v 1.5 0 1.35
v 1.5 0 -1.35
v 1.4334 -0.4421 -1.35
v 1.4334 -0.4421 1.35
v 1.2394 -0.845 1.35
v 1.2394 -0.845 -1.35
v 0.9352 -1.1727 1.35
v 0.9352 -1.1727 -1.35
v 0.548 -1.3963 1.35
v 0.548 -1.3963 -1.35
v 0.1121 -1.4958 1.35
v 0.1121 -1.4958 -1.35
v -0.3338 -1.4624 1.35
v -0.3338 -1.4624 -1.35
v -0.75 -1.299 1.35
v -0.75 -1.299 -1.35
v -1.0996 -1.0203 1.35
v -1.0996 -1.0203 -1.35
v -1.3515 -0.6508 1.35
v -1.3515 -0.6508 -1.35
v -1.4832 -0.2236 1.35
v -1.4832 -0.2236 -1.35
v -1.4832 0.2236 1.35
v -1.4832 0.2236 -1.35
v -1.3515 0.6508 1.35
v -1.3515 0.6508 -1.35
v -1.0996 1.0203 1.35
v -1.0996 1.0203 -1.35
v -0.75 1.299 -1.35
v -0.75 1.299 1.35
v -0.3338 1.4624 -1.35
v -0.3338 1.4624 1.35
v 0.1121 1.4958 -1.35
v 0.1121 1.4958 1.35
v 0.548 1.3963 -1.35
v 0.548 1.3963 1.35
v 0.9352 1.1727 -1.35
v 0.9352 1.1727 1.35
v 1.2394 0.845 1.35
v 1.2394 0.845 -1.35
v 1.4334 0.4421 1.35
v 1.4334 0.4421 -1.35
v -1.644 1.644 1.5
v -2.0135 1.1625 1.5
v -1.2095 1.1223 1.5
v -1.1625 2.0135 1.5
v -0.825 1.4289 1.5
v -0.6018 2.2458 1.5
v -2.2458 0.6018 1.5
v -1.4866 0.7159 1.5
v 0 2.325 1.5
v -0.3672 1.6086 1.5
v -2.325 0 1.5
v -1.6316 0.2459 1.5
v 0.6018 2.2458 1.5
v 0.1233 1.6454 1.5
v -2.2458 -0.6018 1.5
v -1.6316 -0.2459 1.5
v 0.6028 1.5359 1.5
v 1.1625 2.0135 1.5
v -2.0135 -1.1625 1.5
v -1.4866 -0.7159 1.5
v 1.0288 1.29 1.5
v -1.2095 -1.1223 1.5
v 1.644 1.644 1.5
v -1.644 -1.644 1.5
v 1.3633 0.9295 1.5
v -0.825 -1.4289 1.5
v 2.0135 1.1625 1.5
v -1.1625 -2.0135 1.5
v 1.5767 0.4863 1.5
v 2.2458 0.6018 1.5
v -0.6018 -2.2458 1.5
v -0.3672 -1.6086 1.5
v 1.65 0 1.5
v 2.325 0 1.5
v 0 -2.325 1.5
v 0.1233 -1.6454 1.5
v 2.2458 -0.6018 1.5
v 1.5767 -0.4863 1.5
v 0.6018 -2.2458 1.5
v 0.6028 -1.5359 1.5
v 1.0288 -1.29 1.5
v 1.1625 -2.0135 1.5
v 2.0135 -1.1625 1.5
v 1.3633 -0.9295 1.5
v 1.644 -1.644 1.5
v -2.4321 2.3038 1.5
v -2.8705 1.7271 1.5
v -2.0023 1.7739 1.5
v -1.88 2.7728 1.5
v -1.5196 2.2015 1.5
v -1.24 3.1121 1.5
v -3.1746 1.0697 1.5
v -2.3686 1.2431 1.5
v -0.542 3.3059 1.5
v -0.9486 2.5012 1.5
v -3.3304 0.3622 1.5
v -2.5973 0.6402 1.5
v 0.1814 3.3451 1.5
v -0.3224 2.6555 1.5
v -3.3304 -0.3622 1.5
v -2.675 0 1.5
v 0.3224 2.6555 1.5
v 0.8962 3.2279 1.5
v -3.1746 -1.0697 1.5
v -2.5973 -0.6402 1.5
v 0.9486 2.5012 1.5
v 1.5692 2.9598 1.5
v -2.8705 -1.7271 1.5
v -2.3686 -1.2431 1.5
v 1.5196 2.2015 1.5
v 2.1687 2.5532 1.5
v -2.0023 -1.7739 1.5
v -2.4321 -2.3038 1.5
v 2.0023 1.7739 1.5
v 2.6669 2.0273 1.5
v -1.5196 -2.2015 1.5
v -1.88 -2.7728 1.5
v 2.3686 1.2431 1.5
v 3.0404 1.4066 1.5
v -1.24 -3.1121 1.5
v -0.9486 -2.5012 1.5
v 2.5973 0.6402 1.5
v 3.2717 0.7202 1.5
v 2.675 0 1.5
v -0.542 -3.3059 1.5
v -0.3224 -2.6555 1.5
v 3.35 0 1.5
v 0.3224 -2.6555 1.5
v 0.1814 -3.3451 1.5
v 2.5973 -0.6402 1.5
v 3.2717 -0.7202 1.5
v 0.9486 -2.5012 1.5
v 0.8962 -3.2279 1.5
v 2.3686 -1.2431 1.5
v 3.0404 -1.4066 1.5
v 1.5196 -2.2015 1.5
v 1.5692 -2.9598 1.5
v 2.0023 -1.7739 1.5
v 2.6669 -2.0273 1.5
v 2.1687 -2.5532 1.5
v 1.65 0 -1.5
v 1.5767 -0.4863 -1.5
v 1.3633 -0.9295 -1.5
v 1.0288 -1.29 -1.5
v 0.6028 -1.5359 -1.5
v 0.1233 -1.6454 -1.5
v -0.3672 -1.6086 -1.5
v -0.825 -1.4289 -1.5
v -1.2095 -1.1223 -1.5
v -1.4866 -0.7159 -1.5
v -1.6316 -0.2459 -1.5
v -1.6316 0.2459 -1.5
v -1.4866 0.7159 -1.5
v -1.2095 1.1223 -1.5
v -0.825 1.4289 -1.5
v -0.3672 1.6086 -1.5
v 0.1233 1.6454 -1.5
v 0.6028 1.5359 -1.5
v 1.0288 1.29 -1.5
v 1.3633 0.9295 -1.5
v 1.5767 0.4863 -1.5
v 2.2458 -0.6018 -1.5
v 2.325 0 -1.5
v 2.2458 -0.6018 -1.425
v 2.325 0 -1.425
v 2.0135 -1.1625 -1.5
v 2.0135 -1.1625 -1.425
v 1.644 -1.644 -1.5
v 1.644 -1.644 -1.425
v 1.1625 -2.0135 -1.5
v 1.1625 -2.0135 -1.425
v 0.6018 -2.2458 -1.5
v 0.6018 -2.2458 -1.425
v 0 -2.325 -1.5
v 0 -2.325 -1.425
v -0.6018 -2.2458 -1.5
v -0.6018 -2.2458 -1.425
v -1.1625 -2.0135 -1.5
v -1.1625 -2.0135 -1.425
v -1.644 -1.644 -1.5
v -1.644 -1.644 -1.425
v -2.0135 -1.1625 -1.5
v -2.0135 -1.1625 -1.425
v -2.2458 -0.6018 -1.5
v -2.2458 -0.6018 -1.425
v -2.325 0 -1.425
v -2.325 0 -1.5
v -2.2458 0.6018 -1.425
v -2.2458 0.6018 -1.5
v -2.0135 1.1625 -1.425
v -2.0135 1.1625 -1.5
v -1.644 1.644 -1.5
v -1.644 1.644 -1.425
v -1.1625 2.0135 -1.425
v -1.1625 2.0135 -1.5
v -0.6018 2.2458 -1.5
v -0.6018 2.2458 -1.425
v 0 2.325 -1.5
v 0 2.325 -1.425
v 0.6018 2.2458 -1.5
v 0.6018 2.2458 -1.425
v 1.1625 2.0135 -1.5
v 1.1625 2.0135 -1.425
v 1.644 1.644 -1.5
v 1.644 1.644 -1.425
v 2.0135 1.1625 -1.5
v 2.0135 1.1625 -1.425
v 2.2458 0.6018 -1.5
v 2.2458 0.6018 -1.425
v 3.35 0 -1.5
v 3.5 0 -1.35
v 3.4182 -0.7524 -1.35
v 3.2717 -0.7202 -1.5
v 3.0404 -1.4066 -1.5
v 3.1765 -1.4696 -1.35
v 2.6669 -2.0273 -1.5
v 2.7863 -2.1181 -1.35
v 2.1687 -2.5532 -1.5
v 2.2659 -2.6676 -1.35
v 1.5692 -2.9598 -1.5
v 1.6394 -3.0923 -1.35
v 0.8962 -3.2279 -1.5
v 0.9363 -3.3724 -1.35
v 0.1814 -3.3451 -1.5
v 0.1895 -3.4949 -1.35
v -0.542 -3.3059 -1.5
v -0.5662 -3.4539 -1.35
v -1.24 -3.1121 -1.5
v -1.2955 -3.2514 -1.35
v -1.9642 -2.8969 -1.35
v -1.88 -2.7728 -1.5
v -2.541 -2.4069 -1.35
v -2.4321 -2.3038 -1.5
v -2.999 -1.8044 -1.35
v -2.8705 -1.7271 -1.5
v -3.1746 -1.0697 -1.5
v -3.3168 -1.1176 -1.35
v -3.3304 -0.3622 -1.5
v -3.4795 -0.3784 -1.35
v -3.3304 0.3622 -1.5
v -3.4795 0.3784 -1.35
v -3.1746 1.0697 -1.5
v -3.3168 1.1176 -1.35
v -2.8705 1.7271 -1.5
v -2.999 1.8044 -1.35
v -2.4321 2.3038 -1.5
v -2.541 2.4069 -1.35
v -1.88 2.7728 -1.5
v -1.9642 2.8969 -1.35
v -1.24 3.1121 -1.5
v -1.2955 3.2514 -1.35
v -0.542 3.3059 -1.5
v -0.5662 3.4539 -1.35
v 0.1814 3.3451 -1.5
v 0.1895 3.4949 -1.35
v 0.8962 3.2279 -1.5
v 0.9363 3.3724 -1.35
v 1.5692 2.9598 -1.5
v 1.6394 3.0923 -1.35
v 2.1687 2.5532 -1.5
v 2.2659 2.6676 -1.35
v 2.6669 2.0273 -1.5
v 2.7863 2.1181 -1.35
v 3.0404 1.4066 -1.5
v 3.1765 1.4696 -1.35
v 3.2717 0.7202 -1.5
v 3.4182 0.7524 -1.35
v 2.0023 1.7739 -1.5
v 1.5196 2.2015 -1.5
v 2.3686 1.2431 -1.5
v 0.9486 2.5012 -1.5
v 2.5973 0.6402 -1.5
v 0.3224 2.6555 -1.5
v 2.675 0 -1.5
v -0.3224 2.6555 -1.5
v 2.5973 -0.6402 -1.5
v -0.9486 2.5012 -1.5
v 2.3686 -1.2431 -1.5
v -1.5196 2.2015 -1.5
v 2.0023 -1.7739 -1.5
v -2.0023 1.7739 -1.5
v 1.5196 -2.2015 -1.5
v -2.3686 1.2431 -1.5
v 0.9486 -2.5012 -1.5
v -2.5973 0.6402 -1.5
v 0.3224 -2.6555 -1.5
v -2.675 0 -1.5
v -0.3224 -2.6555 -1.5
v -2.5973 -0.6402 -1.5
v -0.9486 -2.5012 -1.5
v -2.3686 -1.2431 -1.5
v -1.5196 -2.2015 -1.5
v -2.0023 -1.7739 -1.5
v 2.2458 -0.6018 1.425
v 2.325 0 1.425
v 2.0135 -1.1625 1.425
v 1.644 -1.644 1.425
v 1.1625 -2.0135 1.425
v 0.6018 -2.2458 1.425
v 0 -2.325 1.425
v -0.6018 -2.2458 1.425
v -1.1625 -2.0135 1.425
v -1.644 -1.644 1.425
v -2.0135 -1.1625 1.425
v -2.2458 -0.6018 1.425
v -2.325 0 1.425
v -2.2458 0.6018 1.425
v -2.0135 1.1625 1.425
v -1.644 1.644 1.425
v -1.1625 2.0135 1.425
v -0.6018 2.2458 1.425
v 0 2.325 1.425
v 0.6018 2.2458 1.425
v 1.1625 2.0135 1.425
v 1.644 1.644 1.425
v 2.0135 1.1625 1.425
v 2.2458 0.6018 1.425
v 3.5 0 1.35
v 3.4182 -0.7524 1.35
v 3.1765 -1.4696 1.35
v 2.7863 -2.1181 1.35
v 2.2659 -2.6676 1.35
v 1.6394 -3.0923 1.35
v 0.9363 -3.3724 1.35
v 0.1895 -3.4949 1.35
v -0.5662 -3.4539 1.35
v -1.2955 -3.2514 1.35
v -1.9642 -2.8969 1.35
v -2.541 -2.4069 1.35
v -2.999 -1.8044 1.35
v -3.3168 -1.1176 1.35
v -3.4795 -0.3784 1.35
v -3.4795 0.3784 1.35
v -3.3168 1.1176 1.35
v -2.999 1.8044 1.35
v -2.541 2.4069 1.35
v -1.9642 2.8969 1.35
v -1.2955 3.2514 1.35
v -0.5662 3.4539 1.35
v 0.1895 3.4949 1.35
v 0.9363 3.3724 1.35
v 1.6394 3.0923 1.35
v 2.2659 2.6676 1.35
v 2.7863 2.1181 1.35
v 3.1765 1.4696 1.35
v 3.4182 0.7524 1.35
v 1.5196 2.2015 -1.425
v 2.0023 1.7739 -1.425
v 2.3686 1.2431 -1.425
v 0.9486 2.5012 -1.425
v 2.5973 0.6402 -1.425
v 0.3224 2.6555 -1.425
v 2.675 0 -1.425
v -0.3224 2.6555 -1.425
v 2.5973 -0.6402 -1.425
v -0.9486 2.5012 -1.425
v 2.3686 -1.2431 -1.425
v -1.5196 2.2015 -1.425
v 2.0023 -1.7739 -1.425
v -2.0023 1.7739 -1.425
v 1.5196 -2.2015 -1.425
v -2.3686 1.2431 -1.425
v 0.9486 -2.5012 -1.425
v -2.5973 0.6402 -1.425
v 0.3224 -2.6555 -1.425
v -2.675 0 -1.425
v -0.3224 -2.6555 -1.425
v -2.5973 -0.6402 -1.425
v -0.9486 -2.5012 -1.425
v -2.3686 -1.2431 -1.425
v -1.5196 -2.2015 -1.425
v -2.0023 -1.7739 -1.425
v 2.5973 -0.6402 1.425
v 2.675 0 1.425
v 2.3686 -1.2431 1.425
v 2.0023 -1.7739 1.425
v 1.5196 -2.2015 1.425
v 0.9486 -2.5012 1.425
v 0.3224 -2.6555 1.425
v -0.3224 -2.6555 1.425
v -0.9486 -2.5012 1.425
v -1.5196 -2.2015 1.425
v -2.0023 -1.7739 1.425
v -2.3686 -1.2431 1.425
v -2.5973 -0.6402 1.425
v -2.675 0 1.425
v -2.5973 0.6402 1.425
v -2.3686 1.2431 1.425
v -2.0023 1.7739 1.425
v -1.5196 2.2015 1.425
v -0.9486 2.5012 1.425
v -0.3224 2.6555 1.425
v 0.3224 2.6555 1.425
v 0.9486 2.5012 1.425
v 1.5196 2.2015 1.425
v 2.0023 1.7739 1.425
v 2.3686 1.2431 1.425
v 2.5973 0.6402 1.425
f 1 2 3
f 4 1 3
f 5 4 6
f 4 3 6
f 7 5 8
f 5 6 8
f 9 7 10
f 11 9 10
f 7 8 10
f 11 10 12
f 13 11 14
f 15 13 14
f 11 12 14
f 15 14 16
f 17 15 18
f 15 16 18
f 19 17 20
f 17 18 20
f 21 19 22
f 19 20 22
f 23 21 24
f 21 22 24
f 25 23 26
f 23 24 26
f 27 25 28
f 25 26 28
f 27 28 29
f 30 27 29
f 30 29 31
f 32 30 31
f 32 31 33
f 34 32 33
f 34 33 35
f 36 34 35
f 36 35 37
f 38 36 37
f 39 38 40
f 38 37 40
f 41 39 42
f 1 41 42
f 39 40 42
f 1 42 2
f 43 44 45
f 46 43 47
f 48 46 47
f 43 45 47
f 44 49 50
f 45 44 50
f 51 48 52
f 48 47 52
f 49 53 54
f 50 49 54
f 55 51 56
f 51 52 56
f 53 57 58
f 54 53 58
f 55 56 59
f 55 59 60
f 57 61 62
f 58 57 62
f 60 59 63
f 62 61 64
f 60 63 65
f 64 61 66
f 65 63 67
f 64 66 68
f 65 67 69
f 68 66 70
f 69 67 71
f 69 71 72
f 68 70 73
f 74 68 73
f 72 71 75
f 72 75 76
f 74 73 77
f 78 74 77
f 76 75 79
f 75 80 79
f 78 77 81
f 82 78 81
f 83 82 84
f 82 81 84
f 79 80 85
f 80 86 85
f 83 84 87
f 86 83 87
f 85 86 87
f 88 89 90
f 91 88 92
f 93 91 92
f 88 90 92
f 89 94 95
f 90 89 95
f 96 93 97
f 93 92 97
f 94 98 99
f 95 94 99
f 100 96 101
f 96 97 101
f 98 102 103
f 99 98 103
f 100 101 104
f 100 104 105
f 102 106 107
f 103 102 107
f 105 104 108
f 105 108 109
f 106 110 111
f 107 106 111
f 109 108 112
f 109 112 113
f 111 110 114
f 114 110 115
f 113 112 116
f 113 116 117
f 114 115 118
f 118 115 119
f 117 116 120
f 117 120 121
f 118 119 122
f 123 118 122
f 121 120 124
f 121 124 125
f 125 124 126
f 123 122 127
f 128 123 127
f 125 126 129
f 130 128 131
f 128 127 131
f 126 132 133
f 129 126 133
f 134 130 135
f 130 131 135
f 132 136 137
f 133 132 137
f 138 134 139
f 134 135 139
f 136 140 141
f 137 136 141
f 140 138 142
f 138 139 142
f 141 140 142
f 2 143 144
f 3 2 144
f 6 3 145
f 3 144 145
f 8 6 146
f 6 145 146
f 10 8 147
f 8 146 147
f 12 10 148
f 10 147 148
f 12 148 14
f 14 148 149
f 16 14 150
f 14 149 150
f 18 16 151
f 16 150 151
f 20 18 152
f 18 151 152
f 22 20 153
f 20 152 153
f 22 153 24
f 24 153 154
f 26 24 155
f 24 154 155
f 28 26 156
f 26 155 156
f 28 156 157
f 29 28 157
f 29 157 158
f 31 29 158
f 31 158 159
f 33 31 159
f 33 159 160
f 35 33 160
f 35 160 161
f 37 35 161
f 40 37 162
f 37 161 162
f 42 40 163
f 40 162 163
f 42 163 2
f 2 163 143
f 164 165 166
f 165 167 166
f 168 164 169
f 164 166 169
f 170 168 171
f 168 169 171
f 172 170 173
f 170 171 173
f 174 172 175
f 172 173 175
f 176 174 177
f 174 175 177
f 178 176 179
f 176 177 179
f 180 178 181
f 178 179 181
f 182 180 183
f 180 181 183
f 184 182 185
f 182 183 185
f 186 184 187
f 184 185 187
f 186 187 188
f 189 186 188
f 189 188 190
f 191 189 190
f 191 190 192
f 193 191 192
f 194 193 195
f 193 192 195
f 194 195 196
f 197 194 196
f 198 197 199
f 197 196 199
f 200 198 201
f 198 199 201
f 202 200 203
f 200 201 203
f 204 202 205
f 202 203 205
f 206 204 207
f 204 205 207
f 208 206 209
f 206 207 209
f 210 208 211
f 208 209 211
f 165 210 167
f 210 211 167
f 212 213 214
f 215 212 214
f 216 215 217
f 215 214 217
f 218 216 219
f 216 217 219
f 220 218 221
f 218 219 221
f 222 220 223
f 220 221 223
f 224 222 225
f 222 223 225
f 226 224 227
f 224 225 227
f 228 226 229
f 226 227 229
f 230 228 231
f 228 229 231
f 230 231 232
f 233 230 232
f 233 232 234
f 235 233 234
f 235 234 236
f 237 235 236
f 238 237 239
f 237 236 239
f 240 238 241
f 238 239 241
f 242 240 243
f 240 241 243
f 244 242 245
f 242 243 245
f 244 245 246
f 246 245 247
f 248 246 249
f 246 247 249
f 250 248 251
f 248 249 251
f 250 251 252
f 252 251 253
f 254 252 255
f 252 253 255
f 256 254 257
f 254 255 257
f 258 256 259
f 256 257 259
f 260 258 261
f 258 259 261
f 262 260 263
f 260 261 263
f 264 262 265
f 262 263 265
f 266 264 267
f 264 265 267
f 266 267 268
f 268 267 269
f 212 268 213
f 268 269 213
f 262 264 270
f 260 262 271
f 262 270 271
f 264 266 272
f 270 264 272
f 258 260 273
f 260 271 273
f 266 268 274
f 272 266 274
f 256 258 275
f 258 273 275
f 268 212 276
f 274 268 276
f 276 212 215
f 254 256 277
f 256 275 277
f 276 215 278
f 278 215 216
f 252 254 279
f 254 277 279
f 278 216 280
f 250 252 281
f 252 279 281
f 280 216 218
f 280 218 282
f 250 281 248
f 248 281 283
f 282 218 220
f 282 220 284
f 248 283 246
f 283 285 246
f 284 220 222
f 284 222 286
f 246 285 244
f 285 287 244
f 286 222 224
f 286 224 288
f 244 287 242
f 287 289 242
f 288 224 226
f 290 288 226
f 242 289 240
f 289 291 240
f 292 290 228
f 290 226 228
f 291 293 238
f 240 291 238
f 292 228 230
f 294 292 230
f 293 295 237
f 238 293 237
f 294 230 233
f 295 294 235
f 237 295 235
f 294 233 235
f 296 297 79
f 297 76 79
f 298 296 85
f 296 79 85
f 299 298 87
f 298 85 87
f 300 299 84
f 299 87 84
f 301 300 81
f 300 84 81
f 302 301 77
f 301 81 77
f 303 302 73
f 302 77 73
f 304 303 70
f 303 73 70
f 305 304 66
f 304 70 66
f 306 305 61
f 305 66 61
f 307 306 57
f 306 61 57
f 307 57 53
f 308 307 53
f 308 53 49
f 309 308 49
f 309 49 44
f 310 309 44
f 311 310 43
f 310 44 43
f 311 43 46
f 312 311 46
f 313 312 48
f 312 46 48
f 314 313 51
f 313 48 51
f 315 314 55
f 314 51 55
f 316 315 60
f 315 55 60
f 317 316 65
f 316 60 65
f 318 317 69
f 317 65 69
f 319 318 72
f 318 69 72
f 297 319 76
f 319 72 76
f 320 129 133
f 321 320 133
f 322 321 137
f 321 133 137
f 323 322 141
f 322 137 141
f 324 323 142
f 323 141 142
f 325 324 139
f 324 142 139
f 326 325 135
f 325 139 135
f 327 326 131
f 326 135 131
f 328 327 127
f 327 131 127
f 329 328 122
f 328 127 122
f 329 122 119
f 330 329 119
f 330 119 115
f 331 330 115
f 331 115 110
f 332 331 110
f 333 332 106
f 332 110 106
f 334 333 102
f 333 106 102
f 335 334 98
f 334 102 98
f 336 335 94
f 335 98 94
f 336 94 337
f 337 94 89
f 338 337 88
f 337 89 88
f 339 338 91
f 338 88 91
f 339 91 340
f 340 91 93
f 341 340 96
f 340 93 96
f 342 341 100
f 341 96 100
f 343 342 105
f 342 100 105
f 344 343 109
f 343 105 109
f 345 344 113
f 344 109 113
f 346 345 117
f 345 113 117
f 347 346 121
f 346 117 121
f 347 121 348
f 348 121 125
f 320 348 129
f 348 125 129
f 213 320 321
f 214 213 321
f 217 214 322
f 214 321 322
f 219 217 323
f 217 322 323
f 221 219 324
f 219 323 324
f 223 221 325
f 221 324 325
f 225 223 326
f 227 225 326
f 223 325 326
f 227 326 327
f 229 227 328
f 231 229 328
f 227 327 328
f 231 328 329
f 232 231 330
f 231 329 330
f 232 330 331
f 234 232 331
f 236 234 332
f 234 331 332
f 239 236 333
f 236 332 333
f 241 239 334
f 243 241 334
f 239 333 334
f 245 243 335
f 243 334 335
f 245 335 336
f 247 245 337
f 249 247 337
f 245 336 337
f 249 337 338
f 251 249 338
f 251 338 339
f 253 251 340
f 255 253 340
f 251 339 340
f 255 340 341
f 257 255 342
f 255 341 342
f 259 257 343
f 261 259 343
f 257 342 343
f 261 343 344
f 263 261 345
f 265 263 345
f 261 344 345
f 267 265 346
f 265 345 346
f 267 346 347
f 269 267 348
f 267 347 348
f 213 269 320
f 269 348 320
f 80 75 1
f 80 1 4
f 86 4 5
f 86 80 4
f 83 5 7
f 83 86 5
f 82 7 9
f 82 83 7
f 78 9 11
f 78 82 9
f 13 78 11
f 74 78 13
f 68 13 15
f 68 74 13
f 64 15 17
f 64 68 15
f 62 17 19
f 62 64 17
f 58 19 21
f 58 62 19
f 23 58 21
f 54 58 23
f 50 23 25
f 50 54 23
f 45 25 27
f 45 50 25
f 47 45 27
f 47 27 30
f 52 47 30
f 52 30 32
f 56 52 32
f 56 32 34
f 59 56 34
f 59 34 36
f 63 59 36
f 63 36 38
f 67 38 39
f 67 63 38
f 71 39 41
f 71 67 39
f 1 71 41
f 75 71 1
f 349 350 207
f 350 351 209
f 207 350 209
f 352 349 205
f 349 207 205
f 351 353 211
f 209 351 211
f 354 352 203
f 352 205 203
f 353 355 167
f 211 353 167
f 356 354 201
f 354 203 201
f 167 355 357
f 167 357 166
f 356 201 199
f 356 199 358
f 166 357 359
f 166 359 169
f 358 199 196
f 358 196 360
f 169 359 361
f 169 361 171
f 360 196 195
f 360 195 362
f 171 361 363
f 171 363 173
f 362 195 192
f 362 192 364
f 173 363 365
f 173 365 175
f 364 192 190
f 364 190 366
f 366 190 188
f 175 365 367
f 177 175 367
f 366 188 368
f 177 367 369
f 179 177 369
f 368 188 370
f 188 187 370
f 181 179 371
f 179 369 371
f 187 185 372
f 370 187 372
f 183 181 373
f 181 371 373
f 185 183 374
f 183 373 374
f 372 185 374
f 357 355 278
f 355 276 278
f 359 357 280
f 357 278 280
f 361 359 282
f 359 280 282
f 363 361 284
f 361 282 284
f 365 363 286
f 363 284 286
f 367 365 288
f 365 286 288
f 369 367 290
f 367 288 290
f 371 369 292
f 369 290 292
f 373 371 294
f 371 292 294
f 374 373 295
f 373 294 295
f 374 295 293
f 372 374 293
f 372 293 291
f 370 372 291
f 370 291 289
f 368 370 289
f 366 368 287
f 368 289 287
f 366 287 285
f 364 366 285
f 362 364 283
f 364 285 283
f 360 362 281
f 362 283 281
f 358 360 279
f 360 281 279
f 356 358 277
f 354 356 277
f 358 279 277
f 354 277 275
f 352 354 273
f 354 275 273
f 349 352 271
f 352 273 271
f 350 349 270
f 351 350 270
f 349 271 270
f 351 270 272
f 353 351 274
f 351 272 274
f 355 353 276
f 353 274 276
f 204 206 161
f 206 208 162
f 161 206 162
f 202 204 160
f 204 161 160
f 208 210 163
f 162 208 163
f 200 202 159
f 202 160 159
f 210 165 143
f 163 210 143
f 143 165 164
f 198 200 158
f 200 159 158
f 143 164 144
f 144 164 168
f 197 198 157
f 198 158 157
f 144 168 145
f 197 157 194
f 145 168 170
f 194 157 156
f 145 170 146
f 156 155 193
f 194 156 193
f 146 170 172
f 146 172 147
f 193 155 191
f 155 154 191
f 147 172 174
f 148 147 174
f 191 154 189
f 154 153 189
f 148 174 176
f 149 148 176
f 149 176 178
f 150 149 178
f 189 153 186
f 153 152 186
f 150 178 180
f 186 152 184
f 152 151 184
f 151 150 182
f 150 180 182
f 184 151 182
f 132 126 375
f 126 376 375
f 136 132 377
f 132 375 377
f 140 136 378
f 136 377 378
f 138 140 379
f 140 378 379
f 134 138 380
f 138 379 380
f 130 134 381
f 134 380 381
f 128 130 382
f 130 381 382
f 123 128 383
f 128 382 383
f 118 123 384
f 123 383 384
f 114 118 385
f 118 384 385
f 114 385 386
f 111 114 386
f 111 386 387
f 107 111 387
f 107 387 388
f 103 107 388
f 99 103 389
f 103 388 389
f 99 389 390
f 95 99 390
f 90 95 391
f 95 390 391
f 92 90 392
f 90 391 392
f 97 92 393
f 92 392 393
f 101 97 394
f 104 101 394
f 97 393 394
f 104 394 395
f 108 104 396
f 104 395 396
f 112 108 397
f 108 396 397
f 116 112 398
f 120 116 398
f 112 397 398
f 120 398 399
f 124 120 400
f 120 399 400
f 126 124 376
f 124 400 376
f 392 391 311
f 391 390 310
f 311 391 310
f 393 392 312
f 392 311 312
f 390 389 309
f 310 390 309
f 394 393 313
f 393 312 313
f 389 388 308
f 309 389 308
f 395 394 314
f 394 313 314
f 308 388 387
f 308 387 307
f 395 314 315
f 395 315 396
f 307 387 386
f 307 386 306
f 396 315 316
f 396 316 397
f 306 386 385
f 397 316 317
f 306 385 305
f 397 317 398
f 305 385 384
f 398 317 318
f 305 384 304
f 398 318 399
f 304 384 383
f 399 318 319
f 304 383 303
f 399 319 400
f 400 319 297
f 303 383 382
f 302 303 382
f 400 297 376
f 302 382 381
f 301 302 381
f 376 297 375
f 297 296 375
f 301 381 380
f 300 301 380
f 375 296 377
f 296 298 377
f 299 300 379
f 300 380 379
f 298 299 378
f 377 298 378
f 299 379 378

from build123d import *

# Parameters (mm, degrees)
CHAMFER1_SIZE = 0.15


with BuildPart() as part:
    # Sketch3 → Revolve1 (revolve)
    with BuildSketch(Plane(origin=(0, 0, 0), x_dir=(1, 0, 0), z_dir=(0, 1, 0))):
        Polygon((1.5, -1.5), (1.5, 1.5), (2.325, 1.5), (2.325, 1.425), (2.675, 1.425), (2.675, 1.5), (3.5, 1.5), (3.5, -1.5), (2.675, -1.5), (2.675, -1.425), (2.325, -1.425), (2.325, -1.5), align=None)
    revolve(axis=Axis((0, 0, 0), (0, 0, -1)))

    # Chamfer1
    chamfer1_edges = [part.edges().sort_by_distance(p)[0] for p in [
        (-3.5, 0, 1.5),
        (-3.5, 0, -1.5),
        (-1.5, 0, -1.5),
        (-1.5, 0, 1.5),
    ]]
    chamfer(chamfer1_edges, length=CHAMFER1_SIZE)


solid = part.part
